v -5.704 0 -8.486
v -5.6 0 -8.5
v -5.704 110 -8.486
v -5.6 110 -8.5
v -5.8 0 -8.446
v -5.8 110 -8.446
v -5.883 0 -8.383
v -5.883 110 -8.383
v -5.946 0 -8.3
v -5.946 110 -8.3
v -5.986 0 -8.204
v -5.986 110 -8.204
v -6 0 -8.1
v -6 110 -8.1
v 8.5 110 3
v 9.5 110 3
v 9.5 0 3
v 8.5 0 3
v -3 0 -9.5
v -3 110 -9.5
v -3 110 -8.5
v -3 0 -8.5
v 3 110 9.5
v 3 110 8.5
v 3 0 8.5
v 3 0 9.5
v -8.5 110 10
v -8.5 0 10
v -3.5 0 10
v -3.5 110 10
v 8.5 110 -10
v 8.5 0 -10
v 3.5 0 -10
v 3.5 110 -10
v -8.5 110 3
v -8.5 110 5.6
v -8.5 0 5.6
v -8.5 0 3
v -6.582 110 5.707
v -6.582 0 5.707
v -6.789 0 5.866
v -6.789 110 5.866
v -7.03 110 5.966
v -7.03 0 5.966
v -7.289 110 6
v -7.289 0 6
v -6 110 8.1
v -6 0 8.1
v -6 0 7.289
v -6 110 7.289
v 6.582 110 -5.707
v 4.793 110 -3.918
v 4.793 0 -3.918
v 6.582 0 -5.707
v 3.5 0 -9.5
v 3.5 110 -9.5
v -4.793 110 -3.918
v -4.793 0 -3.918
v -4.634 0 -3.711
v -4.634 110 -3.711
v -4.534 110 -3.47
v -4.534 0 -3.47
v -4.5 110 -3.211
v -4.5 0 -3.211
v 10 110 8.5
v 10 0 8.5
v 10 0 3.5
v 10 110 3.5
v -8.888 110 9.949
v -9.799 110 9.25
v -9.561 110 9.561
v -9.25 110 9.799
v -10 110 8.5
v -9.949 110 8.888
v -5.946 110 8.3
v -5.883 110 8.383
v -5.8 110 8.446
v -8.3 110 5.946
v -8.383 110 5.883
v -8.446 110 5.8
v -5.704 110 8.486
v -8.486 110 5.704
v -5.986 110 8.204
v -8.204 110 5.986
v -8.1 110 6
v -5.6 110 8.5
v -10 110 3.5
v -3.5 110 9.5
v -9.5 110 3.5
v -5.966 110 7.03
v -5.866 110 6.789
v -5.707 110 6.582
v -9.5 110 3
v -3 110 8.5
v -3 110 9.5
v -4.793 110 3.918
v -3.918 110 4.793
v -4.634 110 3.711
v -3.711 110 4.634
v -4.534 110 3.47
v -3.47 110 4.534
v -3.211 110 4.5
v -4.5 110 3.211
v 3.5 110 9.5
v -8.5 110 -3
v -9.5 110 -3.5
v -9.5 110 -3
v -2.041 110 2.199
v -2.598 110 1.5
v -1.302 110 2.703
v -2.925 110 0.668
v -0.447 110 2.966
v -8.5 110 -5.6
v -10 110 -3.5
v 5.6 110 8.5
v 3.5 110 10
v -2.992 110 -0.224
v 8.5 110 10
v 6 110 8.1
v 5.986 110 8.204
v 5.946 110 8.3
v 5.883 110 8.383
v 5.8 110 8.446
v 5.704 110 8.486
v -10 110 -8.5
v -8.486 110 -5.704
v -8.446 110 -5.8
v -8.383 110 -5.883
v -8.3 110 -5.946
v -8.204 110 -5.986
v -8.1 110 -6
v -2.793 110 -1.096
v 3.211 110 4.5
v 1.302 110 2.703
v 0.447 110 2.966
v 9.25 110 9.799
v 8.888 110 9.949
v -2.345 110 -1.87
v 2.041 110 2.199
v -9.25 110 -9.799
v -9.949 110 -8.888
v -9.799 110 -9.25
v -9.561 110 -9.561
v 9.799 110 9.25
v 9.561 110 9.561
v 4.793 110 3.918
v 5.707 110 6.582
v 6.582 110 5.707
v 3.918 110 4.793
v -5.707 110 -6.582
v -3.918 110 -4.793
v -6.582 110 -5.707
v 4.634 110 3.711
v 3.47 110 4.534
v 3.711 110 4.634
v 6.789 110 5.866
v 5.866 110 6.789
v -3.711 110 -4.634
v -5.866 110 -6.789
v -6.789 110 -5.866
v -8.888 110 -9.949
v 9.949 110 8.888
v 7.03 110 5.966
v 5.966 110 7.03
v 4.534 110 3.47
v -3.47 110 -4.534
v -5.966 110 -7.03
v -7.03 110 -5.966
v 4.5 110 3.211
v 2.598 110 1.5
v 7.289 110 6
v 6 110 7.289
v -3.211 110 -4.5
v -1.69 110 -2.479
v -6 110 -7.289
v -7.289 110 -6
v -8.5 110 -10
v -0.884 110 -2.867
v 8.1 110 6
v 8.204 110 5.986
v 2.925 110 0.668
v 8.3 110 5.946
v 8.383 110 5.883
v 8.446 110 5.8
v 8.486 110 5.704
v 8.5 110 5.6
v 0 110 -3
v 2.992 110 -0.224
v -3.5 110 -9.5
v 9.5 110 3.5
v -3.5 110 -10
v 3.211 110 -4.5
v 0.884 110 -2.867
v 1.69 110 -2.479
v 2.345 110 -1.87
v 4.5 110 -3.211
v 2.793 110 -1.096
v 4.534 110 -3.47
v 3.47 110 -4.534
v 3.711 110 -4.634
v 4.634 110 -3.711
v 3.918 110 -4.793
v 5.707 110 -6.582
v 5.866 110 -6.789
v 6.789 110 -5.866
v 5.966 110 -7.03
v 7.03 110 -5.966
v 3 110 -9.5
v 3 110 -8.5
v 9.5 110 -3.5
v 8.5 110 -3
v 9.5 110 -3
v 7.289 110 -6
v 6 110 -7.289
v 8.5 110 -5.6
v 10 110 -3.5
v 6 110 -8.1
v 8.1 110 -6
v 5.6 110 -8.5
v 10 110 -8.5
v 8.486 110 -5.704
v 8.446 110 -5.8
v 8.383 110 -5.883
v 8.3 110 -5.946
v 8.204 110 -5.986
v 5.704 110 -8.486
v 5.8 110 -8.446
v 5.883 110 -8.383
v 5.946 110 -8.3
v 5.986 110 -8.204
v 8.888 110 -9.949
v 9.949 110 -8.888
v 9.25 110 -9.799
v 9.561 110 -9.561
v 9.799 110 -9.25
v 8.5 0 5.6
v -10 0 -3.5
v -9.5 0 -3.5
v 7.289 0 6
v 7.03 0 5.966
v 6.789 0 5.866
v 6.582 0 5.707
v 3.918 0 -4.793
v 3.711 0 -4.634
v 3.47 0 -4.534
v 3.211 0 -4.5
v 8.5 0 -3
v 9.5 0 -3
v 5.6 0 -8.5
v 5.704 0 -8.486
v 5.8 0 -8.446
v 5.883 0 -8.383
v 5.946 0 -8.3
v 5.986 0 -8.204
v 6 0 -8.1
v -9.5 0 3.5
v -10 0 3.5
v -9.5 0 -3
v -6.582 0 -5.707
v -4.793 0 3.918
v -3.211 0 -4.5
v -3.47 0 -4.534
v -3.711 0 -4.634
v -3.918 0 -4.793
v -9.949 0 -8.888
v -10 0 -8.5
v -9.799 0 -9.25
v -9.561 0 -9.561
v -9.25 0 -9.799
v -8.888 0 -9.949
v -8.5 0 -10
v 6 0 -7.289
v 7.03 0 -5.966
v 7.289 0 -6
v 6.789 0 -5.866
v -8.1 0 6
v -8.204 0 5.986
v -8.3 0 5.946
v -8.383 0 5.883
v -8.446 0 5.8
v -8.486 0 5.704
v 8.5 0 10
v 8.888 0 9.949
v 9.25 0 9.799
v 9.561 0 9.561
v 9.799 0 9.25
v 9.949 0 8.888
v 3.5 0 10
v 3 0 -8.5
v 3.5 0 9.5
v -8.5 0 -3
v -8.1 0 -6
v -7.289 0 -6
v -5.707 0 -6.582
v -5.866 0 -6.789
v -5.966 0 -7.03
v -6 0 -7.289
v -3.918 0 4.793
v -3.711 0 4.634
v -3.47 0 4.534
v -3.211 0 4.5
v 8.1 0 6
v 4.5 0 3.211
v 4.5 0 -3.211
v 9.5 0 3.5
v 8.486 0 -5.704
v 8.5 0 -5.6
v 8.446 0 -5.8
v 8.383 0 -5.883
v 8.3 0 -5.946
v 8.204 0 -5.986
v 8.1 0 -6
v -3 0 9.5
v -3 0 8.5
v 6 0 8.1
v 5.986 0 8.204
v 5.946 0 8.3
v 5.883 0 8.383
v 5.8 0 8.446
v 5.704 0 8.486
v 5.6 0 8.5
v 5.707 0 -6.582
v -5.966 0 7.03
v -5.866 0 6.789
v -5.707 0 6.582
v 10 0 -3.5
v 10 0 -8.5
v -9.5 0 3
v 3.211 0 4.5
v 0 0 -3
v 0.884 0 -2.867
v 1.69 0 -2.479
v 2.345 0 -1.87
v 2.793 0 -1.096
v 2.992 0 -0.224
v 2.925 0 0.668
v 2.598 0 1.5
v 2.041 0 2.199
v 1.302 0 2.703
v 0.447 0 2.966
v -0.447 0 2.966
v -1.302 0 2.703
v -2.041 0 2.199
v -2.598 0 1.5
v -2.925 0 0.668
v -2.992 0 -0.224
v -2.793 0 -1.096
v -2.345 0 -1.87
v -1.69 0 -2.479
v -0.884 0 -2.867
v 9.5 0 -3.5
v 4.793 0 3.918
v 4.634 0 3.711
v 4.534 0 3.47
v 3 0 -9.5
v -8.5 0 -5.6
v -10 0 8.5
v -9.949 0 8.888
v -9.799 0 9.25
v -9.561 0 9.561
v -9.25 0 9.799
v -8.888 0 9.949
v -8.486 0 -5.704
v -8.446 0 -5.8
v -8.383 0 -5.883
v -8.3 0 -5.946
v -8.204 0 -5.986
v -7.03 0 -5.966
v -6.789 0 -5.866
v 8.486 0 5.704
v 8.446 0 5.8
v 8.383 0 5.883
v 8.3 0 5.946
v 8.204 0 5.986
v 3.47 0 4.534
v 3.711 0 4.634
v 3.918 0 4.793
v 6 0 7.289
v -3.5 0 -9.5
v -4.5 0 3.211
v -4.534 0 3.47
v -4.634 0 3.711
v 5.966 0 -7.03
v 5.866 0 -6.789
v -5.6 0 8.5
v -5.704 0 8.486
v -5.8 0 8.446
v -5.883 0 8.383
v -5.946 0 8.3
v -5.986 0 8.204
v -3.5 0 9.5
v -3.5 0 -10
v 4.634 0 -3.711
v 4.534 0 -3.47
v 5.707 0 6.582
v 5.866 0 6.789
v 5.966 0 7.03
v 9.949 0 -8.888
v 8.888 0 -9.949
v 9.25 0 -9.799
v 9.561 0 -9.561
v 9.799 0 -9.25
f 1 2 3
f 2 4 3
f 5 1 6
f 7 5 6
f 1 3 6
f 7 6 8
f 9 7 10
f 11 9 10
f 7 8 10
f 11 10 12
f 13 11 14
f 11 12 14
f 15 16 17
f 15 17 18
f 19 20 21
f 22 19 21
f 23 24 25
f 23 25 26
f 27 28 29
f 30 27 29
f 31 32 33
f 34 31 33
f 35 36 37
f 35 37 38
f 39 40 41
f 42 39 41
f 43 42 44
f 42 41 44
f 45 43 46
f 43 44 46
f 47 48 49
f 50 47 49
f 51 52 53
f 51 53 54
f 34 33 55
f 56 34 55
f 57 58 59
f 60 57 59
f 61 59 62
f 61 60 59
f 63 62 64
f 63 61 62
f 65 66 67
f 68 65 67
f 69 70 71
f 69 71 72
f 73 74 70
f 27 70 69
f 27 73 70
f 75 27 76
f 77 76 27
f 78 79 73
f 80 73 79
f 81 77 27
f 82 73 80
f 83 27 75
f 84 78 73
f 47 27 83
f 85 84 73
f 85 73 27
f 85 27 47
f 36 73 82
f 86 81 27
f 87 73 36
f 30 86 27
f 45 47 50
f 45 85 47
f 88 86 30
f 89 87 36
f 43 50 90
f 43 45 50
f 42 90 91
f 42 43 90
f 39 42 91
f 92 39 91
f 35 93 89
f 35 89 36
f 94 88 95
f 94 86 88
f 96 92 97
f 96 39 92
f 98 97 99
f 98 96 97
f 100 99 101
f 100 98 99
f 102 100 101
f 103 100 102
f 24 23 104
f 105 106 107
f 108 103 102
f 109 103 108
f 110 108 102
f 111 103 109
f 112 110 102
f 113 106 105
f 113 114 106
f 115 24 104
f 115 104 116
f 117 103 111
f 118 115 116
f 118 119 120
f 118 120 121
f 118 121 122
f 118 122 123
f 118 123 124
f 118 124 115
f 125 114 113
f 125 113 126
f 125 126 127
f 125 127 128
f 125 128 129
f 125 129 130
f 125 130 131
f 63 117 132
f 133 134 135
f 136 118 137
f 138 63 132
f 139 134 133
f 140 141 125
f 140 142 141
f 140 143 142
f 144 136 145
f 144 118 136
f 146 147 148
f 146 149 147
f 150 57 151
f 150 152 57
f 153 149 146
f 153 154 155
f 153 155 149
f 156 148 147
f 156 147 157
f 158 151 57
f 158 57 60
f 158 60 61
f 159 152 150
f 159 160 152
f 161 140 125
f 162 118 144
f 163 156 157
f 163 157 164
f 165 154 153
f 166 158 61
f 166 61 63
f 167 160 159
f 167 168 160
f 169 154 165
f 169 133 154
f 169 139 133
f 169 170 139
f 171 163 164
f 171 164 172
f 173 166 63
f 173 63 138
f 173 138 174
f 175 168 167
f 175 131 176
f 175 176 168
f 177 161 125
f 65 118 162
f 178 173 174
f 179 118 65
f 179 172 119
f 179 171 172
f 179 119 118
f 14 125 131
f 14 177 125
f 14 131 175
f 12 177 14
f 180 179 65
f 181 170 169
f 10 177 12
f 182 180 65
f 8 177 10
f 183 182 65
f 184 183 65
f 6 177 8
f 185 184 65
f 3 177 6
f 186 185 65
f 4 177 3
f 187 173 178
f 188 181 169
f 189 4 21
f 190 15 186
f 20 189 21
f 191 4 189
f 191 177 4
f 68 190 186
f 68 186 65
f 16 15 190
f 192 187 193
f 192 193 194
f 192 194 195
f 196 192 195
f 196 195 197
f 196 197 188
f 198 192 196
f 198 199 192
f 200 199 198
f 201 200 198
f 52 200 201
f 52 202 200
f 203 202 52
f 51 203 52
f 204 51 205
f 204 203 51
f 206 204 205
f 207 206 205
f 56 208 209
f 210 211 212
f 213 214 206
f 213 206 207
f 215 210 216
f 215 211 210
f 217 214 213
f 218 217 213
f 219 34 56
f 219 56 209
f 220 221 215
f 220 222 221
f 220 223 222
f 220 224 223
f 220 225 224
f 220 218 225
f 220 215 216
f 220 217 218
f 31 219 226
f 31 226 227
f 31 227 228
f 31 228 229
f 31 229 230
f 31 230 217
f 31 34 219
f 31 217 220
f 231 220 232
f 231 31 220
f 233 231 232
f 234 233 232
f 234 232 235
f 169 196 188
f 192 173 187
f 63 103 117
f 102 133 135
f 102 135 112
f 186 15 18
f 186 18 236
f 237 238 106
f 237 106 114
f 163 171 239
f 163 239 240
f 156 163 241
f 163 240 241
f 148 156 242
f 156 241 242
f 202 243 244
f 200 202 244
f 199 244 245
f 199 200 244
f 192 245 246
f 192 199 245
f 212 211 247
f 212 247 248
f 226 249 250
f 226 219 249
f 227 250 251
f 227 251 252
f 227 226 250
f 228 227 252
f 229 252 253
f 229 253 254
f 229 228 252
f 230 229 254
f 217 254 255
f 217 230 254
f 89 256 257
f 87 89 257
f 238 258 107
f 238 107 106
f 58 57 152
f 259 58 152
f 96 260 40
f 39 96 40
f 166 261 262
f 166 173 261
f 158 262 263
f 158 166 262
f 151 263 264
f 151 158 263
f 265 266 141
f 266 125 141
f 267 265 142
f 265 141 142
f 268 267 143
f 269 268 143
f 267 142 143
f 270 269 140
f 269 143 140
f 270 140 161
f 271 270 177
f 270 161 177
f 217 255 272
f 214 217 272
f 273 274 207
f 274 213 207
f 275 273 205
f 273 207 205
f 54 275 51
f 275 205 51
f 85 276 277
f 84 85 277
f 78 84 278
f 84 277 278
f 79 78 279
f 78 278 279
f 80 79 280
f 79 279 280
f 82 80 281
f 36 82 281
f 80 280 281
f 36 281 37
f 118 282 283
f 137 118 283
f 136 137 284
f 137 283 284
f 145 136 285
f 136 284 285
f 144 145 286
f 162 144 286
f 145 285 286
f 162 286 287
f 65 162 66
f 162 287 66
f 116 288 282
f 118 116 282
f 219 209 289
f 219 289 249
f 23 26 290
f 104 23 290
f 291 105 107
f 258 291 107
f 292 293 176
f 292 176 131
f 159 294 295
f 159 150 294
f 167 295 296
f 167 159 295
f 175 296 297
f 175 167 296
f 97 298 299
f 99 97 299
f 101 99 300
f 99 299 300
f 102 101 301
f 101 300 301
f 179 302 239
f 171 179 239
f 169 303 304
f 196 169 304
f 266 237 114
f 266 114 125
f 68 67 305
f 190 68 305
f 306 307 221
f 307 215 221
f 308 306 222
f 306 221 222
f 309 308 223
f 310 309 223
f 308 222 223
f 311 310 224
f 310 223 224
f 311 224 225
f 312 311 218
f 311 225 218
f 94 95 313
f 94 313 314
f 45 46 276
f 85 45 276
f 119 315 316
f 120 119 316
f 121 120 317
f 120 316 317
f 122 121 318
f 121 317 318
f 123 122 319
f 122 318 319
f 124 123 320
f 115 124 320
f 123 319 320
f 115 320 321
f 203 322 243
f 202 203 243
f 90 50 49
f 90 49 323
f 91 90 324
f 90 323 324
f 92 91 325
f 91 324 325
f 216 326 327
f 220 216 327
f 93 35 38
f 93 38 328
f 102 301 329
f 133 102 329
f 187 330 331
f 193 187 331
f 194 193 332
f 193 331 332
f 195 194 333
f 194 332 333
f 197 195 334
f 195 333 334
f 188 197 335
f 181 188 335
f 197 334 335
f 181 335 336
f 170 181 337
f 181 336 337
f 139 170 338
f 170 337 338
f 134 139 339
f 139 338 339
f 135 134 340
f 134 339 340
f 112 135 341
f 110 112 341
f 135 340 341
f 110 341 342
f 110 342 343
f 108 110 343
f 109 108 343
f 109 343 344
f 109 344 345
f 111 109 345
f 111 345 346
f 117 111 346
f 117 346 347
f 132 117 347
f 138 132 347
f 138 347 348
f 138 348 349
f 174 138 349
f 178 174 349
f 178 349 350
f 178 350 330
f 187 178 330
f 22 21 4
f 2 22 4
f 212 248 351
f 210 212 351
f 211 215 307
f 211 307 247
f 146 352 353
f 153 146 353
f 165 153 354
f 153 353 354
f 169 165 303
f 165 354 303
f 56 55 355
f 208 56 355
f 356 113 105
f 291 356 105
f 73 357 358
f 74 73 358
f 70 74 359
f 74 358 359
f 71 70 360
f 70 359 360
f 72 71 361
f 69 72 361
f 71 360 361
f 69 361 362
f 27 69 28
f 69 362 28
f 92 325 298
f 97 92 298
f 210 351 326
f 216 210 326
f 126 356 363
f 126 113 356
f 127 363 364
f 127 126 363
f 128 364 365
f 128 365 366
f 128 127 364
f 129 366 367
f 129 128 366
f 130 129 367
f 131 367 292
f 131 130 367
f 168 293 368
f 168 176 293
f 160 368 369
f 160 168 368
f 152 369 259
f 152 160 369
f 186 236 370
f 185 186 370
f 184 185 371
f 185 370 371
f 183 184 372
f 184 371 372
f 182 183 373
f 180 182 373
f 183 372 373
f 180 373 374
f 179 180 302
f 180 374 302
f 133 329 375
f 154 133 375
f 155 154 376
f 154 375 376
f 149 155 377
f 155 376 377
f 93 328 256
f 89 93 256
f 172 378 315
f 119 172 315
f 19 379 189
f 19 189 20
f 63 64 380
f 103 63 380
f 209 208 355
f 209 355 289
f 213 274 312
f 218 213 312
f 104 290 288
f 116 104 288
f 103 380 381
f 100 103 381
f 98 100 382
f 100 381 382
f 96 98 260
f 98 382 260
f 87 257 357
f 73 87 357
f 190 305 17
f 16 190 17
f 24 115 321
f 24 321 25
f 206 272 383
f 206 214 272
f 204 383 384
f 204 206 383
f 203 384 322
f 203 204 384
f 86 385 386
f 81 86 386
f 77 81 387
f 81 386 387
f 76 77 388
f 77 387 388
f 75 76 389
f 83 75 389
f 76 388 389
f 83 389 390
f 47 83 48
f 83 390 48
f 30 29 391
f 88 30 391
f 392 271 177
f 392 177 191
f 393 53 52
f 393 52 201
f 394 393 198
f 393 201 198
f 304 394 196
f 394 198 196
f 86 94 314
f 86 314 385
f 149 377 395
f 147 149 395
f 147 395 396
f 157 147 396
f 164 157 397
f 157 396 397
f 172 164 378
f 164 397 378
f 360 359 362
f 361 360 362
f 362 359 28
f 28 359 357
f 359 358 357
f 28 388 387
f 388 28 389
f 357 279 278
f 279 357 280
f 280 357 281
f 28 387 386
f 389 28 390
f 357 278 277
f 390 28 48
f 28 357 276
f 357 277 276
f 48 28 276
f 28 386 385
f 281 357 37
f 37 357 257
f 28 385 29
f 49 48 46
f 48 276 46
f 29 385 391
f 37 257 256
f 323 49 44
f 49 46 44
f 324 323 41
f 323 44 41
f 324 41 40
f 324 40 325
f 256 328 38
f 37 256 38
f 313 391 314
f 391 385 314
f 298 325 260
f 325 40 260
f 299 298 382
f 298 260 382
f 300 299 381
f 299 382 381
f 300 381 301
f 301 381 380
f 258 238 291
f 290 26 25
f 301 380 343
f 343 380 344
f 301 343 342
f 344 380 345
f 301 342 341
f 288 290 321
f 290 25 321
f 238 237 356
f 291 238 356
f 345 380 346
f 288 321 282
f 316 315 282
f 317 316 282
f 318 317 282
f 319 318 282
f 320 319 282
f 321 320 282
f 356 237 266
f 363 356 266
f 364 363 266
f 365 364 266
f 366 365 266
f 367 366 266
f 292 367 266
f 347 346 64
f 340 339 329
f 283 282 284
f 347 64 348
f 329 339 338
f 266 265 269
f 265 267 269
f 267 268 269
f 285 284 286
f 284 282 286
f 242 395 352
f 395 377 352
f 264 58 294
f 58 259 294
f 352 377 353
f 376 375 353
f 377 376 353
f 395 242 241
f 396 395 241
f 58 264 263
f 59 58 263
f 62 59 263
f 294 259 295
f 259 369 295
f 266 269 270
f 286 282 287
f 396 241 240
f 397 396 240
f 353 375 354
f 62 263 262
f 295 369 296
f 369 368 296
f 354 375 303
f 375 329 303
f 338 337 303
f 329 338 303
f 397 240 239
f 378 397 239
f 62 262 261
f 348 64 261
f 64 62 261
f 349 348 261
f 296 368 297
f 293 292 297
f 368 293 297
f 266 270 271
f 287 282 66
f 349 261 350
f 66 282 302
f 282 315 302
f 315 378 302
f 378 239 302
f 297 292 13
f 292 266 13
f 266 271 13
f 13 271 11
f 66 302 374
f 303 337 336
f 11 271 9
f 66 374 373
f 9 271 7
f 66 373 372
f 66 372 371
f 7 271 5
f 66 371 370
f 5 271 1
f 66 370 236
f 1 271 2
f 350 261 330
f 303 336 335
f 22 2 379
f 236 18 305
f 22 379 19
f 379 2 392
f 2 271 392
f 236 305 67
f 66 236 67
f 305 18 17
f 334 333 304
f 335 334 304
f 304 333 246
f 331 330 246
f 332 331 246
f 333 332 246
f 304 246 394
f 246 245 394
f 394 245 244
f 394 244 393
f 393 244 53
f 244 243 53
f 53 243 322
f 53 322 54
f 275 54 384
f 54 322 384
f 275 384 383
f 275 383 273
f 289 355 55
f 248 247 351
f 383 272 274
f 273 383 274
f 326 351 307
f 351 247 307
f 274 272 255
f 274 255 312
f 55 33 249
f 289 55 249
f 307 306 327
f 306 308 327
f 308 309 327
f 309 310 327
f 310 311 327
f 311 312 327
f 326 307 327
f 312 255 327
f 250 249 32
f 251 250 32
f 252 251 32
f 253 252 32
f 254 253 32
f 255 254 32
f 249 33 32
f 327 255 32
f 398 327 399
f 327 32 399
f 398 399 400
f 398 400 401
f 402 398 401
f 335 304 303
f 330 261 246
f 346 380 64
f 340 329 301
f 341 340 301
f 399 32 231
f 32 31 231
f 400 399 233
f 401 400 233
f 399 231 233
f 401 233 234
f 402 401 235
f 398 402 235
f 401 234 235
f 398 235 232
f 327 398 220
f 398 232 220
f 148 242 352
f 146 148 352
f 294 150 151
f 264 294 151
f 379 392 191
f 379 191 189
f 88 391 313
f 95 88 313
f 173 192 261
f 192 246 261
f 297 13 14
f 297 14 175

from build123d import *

# Parameters (mm, degrees)
BOSS_EXTRU_1_CORPS_DEPTH    = 110
CONG_1_R                    = 1.5
CONG_2_R                    = 0.4
CONG_4_R                    = 1
CONG_1_OF_SYM_TRIE_BRAS_R   = 1.5
CONG_2_OF_SYM_TRIE_BRAS_R   = 0.4
CONG_4_OF_SYM_TRIE_BRAS_R   = 1
SYM_TRIE_BRAS_DOUBLE_DEPTH  = 110
APR_S_TARODAGE_M6_R         = 3
ENL_V_MAT_FILETAGE_M6_DEPTH = 111.905365064


# Read off the part's stored shape, not the designer's step: Symétrie Bras double
with BuildPart() as part:
    # Esquisse4 → Boss.-Extru.1 Corps (new body)
    with BuildSketch(Plane(origin=(0, 0, 0), x_dir=(1, 0, 0), z_dir=(0, 1, 0))):
        Polygon((0, 0), (-4.5, 0), (-4.5, 3.625), (-6.875, 6), (-8.5, 6), (-8.5, 3), (-9.5, 3), (-9.5, 3.5), (-10, 3.5), (-10, 10), (-3.5, 10), (-3.5, 9.5), (-3, 9.5), (-3, 8.5), (-6, 8.5), (-6, 6.875), (-3.625, 4.5), (0, 4.5), align=None)
    boss_extru_1_corps = extrude(amount=BOSS_EXTRU_1_CORPS_DEPTH)

    # Congé1
    cong_1_edges = [part.edges().sort_by_distance(p)[0] for p in [
        (-10, 55, -10),
    ]]
    fillet(cong_1_edges, radius=CONG_1_R)

    # Congé2
    cong_2_edges = [part.edges().sort_by_distance(p)[0] for p in [
        (-8.5, 55, -6),
        (-6, 55, -8.5),
    ]]
    fillet(cong_2_edges, radius=CONG_2_R)

    # Congé4
    cong_4_edges = [part.edges().sort_by_distance(p)[0] for p in [
        (-4.5, 55, -3.625),
        (-6.875, 55, -6),
        (-6, 55, -6.875),
        (-3.625, 55, -4.5),
    ]]
    fillet(cong_4_edges, radius=CONG_4_R)

    # Symétrie Bras: Boss.-Extru.1 Corps across plane
    add(boss_extru_1_corps.mirror(Plane(origin=(0, 110, -4.5), x_dir=(0, 0, 1), z_dir=(-1, 0, 0))))

    # Congé1 of Symétrie Bras
    cong_1_of_sym_trie_bras_edges = [part.edges().sort_by_distance(p)[0] for p in [
        (10, 55, -10),
    ]]
    fillet(cong_1_of_sym_trie_bras_edges, radius=CONG_1_OF_SYM_TRIE_BRAS_R)

    # Congé2 of Symétrie Bras
    cong_2_of_sym_trie_bras_edges = [part.edges().sort_by_distance(p)[0] for p in [
        (8.5, 55, -6),
        (6, 55, -8.5),
    ]]
    fillet(cong_2_of_sym_trie_bras_edges, radius=CONG_2_OF_SYM_TRIE_BRAS_R)

    # Congé4 of Symétrie Bras
    cong_4_of_sym_trie_bras_edges = [part.edges().sort_by_distance(p)[0] for p in [
        (4.5, 55, -3.625),
        (6.875, 55, -6),
        (6, 55, -6.875),
        (3.625, 55, -4.5),
    ]]
    fillet(cong_4_of_sym_trie_bras_edges, radius=CONG_4_OF_SYM_TRIE_BRAS_R)

    # Symétrie Bras double outline → Symétrie Bras double (add)
    with BuildSketch(Plane(origin=(0, 0, 0), x_dir=(1, 0, 0), z_dir=(0, 1, 0))):
        with BuildLine():
            ThreePointArc((7.289213562, -6), (6.90653013, -5.923879533), (6.582106781, -5.707106781))
            Line((6.582106781, -5.707106781), (4.792893219, -3.917893219))
            ThreePointArc((4.792893219, -3.917893219), (4.576120467, -3.59346987), (4.5, -3.210786438))
            Line((4.5, -3.210786438), (4.5, 0))
            Line((4.5, 0), (-4.5, 0))
            Line((-4.5, 0), (-4.5, -3.210786438))
            ThreePointArc((-4.5, -3.210786438), (-4.576120467, -3.59346987), (-4.792893219, -3.917893219))
            Line((-4.792893219, -3.917893219), (-6.582106781, -5.707106781))
            ThreePointArc((-6.582106781, -5.707106781), (-6.90653013, -5.923879533), (-7.289213562, -6))
            Line((-7.289213562, -6), (-8.1, -6))
            ThreePointArc((-8.1, -6), (-8.382842712, -5.882842712), (-8.5, -5.6))
            Line((-8.5, -5.6), (-8.5, -3))
            Line((-8.5, -3), (-9.5, -3))
            Line((-9.5, -3), (-9.5, -3.5))
            Line((-9.5, -3.5), (-10, -3.5))
            Line((-10, -3.5), (-10, -8.5))
            ThreePointArc((-10, -8.5), (-9.560660172, -9.560660172), (-8.5, -10))
            Line((-8.5, -10), (-3.5, -10))
            Line((-3.5, -10), (-3.5, -9.5))
            Line((-3.5, -9.5), (-3, -9.5))
            Line((-3, -9.5), (-3, -8.5))
            Line((-3, -8.5), (-5.6, -8.5))
            ThreePointArc((-5.6, -8.5), (-5.882842712, -8.382842712), (-6, -8.1))
            Line((-6, -8.1), (-6, -7.289213562))
            ThreePointArc((-6, -7.289213562), (-5.923879533, -6.90653013), (-5.707106781, -6.582106781))
            Line((-5.707106781, -6.582106781), (-3.917893219, -4.792893219))
            ThreePointArc((-3.917893219, -4.792893219), (-3.59346987, -4.576120467), (-3.210786438, -4.5))
            Line((-3.210786438, -4.5), (3.210786438, -4.5))
            ThreePointArc((3.210786438, -4.5), (3.59346987, -4.576120467), (3.917893219, -4.792893219))
            Line((3.917893219, -4.792893219), (5.707106781, -6.582106781))
            ThreePointArc((5.707106781, -6.582106781), (5.923879533, -6.90653013), (6, -7.289213562))
            Line((6, -7.289213562), (6, -8.1))
            ThreePointArc((6, -8.1), (5.882842712, -8.382842712), (5.6, -8.5))
            Line((5.6, -8.5), (3, -8.5))
            Line((3, -8.5), (3, -9.5))
            Line((3, -9.5), (3.5, -9.5))
            Line((3.5, -9.5), (3.5, -10))
            Line((3.5, -10), (8.5, -10))
            ThreePointArc((8.5, -10), (9.560660172, -9.560660172), (10, -8.5))
            Line((10, -8.5), (10, -3.5))
            Line((10, -3.5), (9.5, -3.5))
            Line((9.5, -3.5), (9.5, -3))
            Line((9.5, -3), (8.5, -3))
            Line((8.5, -3), (8.5, -5.6))
            ThreePointArc((8.5, -5.6), (8.382842712, -5.882842712), (8.1, -6))
            Line((8.1, -6), (7.289213562, -6))
        make_face()
    extrude(amount=SYM_TRIE_BRAS_DOUBLE_DEPTH)

    # Après tarodage M6 → Enlèv. mat.-Filetage M6 (cut, through all)
    with BuildSketch(Plane.XZ):
        with Locations(Location((0, 0, 0), (0, 0, 270))):
            Circle(APR_S_TARODAGE_M6_R)
    extrude(amount=-ENL_V_MAT_FILETAGE_M6_DEPTH, mode=Mode.SUBTRACT)


solid = part.part
